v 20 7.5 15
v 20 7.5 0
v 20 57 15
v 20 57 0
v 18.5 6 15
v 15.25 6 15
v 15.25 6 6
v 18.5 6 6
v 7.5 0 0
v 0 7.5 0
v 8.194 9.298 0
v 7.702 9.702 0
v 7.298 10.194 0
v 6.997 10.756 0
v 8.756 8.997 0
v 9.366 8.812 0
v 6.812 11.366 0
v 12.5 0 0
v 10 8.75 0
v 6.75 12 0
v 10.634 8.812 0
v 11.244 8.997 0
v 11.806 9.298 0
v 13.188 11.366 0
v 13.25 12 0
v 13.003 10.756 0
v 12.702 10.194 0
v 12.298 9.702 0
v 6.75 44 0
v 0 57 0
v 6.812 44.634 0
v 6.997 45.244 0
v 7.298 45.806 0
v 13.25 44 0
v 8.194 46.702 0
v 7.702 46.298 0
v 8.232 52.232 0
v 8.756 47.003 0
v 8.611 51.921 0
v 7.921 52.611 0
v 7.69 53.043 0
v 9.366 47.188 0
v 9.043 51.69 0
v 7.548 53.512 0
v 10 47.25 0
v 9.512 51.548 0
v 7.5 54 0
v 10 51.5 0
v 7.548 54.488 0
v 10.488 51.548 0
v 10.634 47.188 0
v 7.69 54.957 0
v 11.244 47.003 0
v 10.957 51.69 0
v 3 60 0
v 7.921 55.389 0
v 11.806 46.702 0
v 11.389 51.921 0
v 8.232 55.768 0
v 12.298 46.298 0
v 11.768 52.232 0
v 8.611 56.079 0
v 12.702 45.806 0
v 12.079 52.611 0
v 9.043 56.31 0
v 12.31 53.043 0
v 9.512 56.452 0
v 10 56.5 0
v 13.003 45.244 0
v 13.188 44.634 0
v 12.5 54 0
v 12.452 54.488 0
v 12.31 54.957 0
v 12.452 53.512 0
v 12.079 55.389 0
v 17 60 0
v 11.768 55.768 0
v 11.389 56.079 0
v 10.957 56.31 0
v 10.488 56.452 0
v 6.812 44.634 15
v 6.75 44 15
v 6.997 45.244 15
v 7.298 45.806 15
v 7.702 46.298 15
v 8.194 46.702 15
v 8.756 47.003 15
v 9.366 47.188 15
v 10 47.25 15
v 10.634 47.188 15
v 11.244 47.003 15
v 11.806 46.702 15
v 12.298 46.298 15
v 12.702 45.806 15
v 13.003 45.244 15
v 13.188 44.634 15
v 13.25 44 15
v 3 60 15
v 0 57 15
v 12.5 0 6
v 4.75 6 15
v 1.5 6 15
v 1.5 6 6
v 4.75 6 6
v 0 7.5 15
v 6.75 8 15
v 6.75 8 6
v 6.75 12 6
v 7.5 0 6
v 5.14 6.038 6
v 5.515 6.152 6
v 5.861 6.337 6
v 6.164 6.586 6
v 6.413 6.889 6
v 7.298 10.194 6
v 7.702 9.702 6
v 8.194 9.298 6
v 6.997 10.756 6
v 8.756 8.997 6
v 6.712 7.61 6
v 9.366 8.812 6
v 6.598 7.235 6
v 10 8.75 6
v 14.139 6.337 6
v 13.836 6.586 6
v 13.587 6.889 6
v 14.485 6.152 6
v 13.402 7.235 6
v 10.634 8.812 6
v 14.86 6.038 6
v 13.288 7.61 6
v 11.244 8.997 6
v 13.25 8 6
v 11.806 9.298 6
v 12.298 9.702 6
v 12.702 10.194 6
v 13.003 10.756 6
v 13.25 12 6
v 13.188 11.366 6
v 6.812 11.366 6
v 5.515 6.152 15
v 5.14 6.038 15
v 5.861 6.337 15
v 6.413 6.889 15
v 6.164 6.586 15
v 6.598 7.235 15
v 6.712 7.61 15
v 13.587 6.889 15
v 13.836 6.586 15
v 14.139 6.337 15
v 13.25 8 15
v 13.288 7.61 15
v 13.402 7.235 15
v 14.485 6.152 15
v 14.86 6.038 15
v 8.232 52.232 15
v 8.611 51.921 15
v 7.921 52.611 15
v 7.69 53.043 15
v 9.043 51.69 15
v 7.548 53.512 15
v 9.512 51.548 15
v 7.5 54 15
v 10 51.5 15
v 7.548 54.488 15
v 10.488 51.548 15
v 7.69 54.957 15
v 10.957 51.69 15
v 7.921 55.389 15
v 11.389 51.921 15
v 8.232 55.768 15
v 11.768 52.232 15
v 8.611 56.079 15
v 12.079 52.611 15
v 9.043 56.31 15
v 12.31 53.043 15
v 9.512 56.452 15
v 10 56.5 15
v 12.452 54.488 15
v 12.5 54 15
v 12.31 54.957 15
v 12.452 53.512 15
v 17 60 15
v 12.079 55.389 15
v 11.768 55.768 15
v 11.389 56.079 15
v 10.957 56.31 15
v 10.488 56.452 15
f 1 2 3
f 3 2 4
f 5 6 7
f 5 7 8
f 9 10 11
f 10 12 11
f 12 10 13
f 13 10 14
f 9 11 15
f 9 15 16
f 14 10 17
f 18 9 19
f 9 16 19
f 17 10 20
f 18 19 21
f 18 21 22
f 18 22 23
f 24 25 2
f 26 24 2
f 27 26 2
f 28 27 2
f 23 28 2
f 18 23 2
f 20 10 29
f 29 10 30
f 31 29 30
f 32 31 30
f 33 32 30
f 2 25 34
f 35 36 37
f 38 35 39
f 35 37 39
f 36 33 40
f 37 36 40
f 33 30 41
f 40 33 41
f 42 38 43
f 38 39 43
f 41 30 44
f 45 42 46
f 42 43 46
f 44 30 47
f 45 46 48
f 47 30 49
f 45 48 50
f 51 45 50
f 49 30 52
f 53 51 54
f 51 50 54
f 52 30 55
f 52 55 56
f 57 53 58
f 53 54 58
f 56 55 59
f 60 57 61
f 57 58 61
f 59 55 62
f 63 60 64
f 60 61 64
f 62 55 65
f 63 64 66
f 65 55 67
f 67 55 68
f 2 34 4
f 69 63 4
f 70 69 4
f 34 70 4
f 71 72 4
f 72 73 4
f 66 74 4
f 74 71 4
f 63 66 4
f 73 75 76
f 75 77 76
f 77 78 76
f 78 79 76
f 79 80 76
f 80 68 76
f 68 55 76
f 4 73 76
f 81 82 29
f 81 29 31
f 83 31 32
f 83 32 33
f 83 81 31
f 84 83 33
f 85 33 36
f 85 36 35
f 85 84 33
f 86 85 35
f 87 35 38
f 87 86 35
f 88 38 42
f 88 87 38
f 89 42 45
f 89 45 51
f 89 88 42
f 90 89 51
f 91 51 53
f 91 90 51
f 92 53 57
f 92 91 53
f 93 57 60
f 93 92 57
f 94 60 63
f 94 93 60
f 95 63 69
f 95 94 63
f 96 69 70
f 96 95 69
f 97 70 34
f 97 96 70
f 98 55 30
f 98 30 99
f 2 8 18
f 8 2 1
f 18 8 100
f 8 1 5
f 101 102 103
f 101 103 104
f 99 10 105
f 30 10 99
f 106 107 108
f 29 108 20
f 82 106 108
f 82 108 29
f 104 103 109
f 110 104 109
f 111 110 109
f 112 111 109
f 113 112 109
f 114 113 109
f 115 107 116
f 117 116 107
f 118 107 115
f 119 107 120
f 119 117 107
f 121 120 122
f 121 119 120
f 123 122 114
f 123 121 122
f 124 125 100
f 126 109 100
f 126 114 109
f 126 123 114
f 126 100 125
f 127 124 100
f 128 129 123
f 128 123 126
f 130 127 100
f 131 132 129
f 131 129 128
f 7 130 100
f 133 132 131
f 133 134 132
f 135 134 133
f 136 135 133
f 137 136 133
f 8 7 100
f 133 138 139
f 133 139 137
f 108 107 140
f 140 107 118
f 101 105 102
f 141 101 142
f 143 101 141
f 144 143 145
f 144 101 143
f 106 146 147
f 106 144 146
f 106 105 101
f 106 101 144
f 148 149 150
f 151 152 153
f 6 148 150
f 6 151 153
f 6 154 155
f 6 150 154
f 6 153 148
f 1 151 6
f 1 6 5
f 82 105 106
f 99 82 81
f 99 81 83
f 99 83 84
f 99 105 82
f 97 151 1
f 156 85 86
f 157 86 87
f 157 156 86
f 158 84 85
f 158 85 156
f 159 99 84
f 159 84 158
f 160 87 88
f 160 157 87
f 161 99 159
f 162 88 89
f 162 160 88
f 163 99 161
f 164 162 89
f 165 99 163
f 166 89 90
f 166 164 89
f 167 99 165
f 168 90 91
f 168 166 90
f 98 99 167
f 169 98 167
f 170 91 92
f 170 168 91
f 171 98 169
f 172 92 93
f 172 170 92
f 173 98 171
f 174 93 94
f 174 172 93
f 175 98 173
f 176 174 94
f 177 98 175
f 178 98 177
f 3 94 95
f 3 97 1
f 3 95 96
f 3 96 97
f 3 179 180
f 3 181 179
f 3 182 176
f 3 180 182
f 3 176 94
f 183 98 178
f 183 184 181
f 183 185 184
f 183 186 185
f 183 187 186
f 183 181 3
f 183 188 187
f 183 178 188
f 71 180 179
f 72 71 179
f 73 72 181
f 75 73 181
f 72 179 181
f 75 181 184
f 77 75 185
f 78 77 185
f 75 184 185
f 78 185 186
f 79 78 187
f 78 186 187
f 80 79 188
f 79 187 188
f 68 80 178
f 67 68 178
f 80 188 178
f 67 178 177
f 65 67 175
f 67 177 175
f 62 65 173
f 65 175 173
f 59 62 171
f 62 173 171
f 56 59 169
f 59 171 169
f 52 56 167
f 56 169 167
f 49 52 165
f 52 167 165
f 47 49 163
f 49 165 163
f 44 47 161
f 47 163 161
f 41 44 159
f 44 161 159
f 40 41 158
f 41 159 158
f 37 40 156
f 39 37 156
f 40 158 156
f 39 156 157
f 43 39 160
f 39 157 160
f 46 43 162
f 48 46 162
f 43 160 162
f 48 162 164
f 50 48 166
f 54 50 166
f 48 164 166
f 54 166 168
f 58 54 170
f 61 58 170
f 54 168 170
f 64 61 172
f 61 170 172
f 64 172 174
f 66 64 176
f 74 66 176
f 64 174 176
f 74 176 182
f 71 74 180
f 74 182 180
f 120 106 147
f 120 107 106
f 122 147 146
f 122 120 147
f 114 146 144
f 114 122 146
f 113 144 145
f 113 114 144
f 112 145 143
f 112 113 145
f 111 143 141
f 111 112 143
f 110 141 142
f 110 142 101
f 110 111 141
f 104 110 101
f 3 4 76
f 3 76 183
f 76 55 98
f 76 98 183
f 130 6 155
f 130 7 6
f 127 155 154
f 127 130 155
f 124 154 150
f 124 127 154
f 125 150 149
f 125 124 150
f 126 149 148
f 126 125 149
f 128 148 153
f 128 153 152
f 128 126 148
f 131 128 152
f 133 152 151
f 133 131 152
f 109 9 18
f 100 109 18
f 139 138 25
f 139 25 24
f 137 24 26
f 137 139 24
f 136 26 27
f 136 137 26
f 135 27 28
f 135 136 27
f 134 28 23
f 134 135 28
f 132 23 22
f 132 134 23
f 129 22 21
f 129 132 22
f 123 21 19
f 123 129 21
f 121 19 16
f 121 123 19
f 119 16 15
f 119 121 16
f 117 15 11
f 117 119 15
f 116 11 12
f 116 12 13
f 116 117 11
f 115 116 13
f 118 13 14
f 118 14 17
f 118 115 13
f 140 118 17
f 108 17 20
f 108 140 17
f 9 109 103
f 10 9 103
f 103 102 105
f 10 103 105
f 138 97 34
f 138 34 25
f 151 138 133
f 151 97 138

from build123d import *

# Parameters (mm, degrees)
ESQUISSE1_W             = 20
ESQUISSE1_H             = 60
BOSS_EXTRU_1_DEPTH      = 15
ESQUISSE2_R             = 2.5
ENL_V_MAT_EXTRU_1_DEPTH = 15
ESQUISSE3_W             = 20
ESQUISSE3_H             = 6
ENL_V_MAT_EXTRU_2_DEPTH = 9
ENL_V_MAT_EXTRU_3_DEPTH = 15
ESQUISSE7_W             = 6.5
ESQUISSE7_H             = 8
ENL_V_MAT_EXTRU_4_DEPTH = 9
CONG_1_R                = 2
CHANFREIN1_SIZE         = 3


with BuildPart() as part:
    # Esquisse1 → Boss.-Extru.1 (new body)
    with BuildSketch(Plane.XY):
        with Locations((10, 30)):
            Rectangle(ESQUISSE1_W, ESQUISSE1_H)
    extrude(amount=BOSS_EXTRU_1_DEPTH)

    # Esquisse2 → Enlèv. mat.-Extru.1 (cut)
    with BuildSketch(Plane.XY.offset(15)):
        with Locations((10, 54)):
            Circle(ESQUISSE2_R)
        with BuildLine():
            Line((6.75, 12), (6.75, 44))
            ThreePointArc((6.75, 44), (10, 47.25), (13.25, 44))
            Line((13.25, 44), (13.25, 12))
            ThreePointArc((13.25, 12), (10, 8.75), (6.75, 12))
        make_face()
    extrude(amount=-ENL_V_MAT_EXTRU_1_DEPTH, mode=Mode.SUBTRACT)

    # Esquisse3 → Enlèv. mat.-Extru.2 (cut)
    with BuildSketch(Plane.XY.offset(15)):
        with Locations((10, 3)):
            Rectangle(ESQUISSE3_W, ESQUISSE3_H)
    extrude(amount=-ENL_V_MAT_EXTRU_2_DEPTH, mode=Mode.SUBTRACT)

    # Esquisse6 → Enlèv. mat.-Extru.3 (cut)
    with BuildSketch(Plane.XY.offset(15)):
        Polygon((7.5, 0), (0, 7.5), (0, -7.5), (20, -7.5), (20, 7.5), (12.5, 0), align=None)
    extrude(amount=-ENL_V_MAT_EXTRU_3_DEPTH, mode=Mode.SUBTRACT)

    # Esquisse7 → Enlèv. mat.-Extru.4 (cut)
    with BuildSketch(Plane.XY.offset(15)):
        with Locations((10, 10)):
            Rectangle(ESQUISSE7_W, ESQUISSE7_H)
    extrude(amount=-ENL_V_MAT_EXTRU_4_DEPTH, mode=Mode.SUBTRACT)

    # Congé1
    cong_1_edges = [part.edges().sort_by_distance(p)[0] for p in [
        (6.75, 6, 10.5),
        (13.25, 6, 10.5),
    ]]
    fillet(cong_1_edges, radius=CONG_1_R)

    # Chanfrein1
    chanfrein1_edges = [part.edges().sort_by_distance(p)[0] for p in [
        (0, 60, 7.5),
        (20, 60, 7.5),
    ]]
    chamfer(chanfrein1_edges, length=CHANFREIN1_SIZE)


solid = part.part
